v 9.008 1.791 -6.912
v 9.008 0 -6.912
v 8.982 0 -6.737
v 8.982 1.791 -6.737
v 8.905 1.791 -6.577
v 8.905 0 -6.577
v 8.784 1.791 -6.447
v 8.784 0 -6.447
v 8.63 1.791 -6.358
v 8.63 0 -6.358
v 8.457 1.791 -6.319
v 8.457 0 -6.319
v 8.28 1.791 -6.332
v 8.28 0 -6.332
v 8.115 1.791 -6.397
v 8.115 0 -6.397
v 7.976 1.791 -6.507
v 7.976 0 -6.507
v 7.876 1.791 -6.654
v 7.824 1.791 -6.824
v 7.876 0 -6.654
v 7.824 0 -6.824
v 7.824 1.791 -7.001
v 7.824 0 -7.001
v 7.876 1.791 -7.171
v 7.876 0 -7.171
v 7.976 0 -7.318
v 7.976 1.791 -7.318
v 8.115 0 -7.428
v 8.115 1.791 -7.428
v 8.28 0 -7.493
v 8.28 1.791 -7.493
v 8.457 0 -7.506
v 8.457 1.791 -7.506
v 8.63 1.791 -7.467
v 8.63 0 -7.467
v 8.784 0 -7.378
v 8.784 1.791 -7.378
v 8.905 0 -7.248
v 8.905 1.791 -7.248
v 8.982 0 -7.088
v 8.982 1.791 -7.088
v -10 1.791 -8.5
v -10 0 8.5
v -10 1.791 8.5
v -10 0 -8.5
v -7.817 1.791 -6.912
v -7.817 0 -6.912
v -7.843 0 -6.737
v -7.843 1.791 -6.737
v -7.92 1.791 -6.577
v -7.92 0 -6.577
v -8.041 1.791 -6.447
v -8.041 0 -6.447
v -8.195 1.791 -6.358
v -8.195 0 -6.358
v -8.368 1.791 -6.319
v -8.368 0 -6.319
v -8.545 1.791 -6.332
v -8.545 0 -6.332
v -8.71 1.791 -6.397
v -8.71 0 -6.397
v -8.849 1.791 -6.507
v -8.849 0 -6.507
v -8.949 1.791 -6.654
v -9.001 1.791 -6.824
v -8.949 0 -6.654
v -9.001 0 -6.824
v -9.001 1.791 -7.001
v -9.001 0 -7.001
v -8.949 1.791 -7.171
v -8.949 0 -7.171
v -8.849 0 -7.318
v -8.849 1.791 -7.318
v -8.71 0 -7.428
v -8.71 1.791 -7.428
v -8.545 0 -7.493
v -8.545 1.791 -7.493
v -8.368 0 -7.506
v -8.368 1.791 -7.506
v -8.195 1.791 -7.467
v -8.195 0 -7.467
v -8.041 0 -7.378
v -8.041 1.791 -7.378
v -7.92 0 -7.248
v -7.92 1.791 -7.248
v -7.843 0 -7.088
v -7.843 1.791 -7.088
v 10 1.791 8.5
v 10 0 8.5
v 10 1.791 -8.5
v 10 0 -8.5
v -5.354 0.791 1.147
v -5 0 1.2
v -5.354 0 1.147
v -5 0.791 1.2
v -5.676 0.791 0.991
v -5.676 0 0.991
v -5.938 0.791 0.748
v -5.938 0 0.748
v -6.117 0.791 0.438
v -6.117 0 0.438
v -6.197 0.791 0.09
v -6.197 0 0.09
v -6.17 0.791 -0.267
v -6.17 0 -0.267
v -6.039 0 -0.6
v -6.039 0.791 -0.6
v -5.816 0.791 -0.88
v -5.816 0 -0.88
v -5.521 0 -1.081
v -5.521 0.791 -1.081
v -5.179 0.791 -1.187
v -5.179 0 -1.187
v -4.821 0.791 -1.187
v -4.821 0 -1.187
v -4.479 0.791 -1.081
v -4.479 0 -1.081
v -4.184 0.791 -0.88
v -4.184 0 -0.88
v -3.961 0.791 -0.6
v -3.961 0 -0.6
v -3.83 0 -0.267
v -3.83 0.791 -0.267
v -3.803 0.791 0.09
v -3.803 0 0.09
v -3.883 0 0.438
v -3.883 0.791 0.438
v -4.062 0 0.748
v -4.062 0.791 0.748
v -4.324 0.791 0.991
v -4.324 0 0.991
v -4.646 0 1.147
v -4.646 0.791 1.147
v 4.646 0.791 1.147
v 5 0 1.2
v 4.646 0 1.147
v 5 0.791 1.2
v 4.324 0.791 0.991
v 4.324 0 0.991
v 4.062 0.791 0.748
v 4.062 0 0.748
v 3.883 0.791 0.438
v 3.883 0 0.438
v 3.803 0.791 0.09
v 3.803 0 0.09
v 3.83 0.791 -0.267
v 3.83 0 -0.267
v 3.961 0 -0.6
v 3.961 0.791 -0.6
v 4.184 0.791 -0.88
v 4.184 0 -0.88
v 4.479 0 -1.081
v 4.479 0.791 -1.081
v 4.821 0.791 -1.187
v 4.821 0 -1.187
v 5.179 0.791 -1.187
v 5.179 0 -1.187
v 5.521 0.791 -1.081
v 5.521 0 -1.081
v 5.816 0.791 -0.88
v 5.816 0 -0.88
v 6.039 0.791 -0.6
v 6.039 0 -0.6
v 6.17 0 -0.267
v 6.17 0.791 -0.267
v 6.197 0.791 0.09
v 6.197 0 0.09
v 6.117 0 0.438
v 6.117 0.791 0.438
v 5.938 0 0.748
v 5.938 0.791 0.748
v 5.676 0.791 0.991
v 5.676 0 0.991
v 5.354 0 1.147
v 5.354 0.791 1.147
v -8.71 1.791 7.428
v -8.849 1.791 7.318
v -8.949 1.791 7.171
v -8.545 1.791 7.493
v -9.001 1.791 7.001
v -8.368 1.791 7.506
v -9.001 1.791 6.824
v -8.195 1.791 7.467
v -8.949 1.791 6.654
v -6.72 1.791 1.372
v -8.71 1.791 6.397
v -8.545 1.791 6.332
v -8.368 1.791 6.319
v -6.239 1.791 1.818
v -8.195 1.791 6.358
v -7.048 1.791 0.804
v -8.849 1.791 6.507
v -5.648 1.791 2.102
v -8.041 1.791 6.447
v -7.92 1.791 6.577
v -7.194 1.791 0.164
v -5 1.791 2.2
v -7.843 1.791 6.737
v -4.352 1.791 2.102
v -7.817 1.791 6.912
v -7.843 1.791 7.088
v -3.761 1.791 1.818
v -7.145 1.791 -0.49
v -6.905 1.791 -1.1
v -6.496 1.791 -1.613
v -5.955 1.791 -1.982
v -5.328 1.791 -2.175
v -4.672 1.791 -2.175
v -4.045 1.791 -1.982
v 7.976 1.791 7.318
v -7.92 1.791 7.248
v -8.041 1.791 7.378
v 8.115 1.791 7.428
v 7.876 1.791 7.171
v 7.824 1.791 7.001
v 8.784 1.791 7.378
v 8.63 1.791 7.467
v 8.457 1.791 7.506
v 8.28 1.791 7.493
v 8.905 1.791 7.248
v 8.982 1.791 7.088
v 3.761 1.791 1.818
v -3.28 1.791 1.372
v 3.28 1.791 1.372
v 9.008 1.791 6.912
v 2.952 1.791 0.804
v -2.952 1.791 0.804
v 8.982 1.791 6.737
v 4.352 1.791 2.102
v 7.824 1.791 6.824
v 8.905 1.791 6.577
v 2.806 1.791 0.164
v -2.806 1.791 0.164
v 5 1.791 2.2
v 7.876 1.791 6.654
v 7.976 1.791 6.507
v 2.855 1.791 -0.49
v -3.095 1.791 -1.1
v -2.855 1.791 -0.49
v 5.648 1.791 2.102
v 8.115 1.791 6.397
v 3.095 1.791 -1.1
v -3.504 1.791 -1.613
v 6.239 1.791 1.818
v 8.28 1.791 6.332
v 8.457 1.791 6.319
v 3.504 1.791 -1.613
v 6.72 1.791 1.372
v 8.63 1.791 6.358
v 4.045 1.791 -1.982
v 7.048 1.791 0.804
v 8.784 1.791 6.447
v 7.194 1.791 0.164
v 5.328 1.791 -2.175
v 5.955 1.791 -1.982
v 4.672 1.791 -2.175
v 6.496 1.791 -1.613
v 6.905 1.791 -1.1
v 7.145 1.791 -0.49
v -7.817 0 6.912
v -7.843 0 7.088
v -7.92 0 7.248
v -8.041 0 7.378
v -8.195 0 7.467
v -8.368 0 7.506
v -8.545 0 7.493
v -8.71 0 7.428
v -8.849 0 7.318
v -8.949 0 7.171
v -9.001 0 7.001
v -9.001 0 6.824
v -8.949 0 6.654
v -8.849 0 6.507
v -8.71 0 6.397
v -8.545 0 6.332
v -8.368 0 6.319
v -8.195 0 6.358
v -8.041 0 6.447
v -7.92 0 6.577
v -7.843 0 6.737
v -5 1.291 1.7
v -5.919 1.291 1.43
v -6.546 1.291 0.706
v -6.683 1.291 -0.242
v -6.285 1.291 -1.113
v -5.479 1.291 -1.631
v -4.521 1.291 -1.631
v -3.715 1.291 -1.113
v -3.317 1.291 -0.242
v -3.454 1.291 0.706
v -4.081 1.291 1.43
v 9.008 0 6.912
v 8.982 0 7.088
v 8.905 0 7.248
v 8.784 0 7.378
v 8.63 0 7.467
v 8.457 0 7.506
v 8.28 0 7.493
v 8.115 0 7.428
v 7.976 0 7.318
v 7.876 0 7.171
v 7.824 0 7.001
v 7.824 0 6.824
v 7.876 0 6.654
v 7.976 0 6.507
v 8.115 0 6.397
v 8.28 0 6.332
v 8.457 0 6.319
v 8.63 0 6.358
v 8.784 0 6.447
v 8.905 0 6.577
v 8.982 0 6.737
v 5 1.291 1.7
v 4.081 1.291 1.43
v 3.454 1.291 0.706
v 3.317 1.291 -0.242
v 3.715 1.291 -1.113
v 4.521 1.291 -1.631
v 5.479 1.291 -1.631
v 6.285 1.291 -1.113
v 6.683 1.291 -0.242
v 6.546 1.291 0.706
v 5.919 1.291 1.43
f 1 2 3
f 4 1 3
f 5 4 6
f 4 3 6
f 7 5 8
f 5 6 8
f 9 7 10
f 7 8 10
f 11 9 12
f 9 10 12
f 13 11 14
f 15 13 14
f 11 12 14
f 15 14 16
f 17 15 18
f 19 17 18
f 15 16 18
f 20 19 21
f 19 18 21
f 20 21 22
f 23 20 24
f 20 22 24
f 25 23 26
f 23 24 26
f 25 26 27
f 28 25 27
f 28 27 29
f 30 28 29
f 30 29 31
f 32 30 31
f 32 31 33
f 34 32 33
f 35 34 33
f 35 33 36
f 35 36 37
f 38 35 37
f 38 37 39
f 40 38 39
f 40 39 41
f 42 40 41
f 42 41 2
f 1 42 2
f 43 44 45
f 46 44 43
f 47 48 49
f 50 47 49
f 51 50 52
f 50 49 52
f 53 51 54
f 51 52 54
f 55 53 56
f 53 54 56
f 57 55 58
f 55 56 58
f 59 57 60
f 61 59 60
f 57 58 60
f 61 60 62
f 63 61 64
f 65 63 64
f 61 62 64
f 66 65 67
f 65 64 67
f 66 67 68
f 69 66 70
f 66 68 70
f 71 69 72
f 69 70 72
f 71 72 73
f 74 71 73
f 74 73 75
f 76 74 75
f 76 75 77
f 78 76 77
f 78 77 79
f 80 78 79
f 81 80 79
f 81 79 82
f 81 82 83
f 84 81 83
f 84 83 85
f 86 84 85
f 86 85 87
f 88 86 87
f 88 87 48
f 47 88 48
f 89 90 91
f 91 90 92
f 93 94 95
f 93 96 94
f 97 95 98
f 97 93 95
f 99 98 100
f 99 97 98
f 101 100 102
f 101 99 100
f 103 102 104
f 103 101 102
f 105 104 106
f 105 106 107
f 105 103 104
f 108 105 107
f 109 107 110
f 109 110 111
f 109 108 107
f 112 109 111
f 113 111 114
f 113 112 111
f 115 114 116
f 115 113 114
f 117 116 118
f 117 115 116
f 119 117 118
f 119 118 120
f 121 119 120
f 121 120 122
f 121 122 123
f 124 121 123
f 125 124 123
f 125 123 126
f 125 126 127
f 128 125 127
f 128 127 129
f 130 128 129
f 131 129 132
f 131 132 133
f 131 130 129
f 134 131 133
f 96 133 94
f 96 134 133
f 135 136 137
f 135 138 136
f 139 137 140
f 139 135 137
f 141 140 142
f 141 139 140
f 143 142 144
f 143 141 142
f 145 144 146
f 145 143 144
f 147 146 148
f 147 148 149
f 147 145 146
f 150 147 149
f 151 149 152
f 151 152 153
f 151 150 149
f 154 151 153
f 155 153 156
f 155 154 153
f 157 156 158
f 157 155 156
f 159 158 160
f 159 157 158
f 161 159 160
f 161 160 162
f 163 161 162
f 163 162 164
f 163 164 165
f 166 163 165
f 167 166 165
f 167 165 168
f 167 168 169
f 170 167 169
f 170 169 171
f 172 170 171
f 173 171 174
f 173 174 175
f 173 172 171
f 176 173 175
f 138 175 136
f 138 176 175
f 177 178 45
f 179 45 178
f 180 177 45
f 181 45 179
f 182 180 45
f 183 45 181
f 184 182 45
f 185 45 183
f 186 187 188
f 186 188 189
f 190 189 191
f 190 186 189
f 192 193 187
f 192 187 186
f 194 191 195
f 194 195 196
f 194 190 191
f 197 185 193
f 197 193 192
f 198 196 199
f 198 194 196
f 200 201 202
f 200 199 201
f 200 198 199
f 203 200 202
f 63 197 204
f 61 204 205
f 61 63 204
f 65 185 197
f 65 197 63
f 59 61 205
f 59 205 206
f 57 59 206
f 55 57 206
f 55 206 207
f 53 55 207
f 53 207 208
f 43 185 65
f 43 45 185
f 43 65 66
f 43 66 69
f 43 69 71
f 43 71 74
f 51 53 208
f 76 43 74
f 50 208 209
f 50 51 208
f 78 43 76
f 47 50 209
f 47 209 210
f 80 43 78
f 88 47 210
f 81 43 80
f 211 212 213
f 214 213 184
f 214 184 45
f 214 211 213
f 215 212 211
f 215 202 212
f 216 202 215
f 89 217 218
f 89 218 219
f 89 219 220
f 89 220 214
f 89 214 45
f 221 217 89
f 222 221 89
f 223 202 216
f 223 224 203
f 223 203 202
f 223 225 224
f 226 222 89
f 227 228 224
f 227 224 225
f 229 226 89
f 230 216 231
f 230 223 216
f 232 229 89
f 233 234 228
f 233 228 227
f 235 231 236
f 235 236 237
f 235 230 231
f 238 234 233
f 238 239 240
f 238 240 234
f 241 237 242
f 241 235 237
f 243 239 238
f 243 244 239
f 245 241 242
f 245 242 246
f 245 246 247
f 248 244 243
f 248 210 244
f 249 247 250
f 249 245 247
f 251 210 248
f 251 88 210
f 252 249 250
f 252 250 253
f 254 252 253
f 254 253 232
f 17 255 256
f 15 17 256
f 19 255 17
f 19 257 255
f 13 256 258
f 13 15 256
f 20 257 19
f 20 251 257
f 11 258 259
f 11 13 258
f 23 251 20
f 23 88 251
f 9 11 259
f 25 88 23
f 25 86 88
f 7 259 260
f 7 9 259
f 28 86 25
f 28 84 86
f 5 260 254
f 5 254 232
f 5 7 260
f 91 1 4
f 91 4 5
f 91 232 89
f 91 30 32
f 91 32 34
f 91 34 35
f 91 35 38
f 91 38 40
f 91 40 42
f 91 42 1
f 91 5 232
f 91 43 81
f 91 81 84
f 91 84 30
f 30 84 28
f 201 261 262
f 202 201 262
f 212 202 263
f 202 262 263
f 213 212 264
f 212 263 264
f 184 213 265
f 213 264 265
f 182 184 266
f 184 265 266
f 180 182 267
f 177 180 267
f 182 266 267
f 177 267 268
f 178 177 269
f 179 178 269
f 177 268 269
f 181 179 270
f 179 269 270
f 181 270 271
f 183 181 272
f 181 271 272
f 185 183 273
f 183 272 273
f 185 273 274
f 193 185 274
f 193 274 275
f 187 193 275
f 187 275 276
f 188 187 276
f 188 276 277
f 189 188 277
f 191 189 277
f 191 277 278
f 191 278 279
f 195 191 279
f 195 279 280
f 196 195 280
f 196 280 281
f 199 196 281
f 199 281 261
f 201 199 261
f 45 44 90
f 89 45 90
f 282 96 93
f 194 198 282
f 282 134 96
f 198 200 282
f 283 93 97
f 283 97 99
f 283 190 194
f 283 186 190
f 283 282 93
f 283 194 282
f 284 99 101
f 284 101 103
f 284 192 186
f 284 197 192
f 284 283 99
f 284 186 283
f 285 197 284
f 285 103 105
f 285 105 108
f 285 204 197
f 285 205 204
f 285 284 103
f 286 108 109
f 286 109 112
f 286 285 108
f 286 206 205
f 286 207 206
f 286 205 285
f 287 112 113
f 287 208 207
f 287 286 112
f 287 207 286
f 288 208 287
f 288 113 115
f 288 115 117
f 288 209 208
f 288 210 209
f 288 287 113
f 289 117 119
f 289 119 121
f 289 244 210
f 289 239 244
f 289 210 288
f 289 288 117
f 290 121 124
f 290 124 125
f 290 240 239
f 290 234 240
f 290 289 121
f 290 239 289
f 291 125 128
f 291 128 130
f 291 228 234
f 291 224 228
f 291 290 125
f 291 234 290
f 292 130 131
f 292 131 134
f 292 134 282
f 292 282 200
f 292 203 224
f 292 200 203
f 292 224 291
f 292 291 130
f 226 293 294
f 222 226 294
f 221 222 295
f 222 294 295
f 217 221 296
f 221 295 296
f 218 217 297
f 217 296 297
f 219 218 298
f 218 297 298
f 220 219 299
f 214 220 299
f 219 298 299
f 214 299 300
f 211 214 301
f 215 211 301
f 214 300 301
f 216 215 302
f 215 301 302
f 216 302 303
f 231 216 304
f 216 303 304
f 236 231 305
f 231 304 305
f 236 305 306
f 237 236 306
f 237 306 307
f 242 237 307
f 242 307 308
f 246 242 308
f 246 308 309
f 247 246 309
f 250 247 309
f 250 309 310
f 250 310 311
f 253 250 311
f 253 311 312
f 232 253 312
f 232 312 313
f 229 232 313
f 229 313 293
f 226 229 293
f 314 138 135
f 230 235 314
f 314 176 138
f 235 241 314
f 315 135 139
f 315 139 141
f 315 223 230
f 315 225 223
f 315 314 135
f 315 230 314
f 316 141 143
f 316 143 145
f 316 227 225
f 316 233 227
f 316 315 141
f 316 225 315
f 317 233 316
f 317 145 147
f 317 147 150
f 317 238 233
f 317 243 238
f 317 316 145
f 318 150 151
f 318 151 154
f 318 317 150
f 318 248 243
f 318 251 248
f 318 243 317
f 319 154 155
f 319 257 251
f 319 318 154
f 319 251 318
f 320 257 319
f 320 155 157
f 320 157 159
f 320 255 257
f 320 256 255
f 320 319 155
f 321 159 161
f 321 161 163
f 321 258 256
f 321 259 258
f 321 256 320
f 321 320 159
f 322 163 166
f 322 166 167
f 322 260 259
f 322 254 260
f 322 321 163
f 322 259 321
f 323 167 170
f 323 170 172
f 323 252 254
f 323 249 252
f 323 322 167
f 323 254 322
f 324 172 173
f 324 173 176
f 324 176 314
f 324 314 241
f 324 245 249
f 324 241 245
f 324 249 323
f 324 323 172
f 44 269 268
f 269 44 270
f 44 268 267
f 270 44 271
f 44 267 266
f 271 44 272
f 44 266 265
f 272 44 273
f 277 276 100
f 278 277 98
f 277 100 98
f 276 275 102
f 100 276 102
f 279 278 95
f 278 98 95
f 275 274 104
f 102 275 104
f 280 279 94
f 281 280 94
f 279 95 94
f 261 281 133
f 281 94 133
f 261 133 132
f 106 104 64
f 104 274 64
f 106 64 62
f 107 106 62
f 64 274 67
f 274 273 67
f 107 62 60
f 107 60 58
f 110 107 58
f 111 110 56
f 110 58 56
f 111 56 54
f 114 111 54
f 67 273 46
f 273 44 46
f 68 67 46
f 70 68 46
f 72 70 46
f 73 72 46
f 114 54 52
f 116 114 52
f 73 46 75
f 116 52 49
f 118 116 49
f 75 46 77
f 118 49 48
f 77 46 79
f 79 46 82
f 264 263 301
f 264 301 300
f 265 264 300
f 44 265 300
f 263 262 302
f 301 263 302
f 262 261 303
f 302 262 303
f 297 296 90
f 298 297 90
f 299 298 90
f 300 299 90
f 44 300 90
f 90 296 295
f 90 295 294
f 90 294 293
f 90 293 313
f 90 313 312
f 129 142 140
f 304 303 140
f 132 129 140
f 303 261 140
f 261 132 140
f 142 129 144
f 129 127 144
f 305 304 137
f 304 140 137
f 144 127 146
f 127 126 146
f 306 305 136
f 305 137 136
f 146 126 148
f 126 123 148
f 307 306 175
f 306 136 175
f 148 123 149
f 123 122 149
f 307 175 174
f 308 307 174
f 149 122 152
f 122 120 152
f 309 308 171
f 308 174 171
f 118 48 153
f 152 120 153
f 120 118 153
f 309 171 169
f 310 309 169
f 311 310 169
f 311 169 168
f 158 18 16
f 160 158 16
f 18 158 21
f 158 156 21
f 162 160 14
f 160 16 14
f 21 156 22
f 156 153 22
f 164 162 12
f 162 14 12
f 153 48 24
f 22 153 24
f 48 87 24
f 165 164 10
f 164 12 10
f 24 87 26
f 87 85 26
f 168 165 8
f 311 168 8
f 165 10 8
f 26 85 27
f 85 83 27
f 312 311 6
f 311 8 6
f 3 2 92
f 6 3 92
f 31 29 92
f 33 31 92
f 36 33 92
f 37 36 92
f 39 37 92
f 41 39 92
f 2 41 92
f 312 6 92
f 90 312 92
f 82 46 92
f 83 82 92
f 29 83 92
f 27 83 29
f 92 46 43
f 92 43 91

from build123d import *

# Parameters (mm, degrees)
SKETCH1_W                                      = 20
SKETCH1_H                                      = 17
BOSS_EXTRUDE1_DEPTH                            = 1.7907
F_0_80_TAPPED_HOLE1_D                          = 1.19126
CSK_FOR_M2_FLAT_HEAD_MACHINE_SCREW1_AT_2_COUNT = 2
CSK_FOR_M2_FLAT_HEAD_MACHINE_SCREW1_AT_2_PITCH = 10


with BuildPart() as part:
    # Sketch1 → Boss-Extrude1 (new body)
    with BuildSketch(Plane(origin=(0, 0, 0), x_dir=(1, 0, 0), z_dir=(0, 1, 0))):
        Rectangle(SKETCH1_W, SKETCH1_H)
    extrude(amount=BOSS_EXTRUDE1_DEPTH)

    # #0-80 Tapped Hole1 (through all)
    with Locations(Plane(origin=(0, 1.7907, 0), x_dir=(-1, 0, 0), z_dir=(0, 1, 0))):
        with Locations((-8.4125, -6.9125), (-8.4125, 6.9125), (8.4125, -6.9125), (8.4125, 6.9125)):
            Hole(F_0_80_TAPPED_HOLE1_D / 2)

    # Sketch4 → CSK for M2 Flat Head Machine Screw1 (revolve, cut)
    with BuildSketch(Plane(origin=(-5, 1.7907, 0), x_dir=(0, 0, 1), z_dir=(1, 0, 0))):
        Polygon((0, 0), (0, 1.7907), (1.2, 1.7907), (1.2, 1), (2.2, 0), align=None)
    csk_for_m2_flat_head_machine_screw1 = revolve(axis=Axis((-5, 8.1407, 0), (0, -1, 0)), mode=Mode.SUBTRACT)

    # CSK for M2 Flat Head Machine Screw1 at 2: CSK for M2 Flat Head Machine Screw1 ×2
    with Locations(*[(i * CSK_FOR_M2_FLAT_HEAD_MACHINE_SCREW1_AT_2_PITCH, 0, 0) for i in range(1, CSK_FOR_M2_FLAT_HEAD_MACHINE_SCREW1_AT_2_COUNT)]):
        add(csk_for_m2_flat_head_machine_screw1, mode=Mode.SUBTRACT)


solid = part.part
